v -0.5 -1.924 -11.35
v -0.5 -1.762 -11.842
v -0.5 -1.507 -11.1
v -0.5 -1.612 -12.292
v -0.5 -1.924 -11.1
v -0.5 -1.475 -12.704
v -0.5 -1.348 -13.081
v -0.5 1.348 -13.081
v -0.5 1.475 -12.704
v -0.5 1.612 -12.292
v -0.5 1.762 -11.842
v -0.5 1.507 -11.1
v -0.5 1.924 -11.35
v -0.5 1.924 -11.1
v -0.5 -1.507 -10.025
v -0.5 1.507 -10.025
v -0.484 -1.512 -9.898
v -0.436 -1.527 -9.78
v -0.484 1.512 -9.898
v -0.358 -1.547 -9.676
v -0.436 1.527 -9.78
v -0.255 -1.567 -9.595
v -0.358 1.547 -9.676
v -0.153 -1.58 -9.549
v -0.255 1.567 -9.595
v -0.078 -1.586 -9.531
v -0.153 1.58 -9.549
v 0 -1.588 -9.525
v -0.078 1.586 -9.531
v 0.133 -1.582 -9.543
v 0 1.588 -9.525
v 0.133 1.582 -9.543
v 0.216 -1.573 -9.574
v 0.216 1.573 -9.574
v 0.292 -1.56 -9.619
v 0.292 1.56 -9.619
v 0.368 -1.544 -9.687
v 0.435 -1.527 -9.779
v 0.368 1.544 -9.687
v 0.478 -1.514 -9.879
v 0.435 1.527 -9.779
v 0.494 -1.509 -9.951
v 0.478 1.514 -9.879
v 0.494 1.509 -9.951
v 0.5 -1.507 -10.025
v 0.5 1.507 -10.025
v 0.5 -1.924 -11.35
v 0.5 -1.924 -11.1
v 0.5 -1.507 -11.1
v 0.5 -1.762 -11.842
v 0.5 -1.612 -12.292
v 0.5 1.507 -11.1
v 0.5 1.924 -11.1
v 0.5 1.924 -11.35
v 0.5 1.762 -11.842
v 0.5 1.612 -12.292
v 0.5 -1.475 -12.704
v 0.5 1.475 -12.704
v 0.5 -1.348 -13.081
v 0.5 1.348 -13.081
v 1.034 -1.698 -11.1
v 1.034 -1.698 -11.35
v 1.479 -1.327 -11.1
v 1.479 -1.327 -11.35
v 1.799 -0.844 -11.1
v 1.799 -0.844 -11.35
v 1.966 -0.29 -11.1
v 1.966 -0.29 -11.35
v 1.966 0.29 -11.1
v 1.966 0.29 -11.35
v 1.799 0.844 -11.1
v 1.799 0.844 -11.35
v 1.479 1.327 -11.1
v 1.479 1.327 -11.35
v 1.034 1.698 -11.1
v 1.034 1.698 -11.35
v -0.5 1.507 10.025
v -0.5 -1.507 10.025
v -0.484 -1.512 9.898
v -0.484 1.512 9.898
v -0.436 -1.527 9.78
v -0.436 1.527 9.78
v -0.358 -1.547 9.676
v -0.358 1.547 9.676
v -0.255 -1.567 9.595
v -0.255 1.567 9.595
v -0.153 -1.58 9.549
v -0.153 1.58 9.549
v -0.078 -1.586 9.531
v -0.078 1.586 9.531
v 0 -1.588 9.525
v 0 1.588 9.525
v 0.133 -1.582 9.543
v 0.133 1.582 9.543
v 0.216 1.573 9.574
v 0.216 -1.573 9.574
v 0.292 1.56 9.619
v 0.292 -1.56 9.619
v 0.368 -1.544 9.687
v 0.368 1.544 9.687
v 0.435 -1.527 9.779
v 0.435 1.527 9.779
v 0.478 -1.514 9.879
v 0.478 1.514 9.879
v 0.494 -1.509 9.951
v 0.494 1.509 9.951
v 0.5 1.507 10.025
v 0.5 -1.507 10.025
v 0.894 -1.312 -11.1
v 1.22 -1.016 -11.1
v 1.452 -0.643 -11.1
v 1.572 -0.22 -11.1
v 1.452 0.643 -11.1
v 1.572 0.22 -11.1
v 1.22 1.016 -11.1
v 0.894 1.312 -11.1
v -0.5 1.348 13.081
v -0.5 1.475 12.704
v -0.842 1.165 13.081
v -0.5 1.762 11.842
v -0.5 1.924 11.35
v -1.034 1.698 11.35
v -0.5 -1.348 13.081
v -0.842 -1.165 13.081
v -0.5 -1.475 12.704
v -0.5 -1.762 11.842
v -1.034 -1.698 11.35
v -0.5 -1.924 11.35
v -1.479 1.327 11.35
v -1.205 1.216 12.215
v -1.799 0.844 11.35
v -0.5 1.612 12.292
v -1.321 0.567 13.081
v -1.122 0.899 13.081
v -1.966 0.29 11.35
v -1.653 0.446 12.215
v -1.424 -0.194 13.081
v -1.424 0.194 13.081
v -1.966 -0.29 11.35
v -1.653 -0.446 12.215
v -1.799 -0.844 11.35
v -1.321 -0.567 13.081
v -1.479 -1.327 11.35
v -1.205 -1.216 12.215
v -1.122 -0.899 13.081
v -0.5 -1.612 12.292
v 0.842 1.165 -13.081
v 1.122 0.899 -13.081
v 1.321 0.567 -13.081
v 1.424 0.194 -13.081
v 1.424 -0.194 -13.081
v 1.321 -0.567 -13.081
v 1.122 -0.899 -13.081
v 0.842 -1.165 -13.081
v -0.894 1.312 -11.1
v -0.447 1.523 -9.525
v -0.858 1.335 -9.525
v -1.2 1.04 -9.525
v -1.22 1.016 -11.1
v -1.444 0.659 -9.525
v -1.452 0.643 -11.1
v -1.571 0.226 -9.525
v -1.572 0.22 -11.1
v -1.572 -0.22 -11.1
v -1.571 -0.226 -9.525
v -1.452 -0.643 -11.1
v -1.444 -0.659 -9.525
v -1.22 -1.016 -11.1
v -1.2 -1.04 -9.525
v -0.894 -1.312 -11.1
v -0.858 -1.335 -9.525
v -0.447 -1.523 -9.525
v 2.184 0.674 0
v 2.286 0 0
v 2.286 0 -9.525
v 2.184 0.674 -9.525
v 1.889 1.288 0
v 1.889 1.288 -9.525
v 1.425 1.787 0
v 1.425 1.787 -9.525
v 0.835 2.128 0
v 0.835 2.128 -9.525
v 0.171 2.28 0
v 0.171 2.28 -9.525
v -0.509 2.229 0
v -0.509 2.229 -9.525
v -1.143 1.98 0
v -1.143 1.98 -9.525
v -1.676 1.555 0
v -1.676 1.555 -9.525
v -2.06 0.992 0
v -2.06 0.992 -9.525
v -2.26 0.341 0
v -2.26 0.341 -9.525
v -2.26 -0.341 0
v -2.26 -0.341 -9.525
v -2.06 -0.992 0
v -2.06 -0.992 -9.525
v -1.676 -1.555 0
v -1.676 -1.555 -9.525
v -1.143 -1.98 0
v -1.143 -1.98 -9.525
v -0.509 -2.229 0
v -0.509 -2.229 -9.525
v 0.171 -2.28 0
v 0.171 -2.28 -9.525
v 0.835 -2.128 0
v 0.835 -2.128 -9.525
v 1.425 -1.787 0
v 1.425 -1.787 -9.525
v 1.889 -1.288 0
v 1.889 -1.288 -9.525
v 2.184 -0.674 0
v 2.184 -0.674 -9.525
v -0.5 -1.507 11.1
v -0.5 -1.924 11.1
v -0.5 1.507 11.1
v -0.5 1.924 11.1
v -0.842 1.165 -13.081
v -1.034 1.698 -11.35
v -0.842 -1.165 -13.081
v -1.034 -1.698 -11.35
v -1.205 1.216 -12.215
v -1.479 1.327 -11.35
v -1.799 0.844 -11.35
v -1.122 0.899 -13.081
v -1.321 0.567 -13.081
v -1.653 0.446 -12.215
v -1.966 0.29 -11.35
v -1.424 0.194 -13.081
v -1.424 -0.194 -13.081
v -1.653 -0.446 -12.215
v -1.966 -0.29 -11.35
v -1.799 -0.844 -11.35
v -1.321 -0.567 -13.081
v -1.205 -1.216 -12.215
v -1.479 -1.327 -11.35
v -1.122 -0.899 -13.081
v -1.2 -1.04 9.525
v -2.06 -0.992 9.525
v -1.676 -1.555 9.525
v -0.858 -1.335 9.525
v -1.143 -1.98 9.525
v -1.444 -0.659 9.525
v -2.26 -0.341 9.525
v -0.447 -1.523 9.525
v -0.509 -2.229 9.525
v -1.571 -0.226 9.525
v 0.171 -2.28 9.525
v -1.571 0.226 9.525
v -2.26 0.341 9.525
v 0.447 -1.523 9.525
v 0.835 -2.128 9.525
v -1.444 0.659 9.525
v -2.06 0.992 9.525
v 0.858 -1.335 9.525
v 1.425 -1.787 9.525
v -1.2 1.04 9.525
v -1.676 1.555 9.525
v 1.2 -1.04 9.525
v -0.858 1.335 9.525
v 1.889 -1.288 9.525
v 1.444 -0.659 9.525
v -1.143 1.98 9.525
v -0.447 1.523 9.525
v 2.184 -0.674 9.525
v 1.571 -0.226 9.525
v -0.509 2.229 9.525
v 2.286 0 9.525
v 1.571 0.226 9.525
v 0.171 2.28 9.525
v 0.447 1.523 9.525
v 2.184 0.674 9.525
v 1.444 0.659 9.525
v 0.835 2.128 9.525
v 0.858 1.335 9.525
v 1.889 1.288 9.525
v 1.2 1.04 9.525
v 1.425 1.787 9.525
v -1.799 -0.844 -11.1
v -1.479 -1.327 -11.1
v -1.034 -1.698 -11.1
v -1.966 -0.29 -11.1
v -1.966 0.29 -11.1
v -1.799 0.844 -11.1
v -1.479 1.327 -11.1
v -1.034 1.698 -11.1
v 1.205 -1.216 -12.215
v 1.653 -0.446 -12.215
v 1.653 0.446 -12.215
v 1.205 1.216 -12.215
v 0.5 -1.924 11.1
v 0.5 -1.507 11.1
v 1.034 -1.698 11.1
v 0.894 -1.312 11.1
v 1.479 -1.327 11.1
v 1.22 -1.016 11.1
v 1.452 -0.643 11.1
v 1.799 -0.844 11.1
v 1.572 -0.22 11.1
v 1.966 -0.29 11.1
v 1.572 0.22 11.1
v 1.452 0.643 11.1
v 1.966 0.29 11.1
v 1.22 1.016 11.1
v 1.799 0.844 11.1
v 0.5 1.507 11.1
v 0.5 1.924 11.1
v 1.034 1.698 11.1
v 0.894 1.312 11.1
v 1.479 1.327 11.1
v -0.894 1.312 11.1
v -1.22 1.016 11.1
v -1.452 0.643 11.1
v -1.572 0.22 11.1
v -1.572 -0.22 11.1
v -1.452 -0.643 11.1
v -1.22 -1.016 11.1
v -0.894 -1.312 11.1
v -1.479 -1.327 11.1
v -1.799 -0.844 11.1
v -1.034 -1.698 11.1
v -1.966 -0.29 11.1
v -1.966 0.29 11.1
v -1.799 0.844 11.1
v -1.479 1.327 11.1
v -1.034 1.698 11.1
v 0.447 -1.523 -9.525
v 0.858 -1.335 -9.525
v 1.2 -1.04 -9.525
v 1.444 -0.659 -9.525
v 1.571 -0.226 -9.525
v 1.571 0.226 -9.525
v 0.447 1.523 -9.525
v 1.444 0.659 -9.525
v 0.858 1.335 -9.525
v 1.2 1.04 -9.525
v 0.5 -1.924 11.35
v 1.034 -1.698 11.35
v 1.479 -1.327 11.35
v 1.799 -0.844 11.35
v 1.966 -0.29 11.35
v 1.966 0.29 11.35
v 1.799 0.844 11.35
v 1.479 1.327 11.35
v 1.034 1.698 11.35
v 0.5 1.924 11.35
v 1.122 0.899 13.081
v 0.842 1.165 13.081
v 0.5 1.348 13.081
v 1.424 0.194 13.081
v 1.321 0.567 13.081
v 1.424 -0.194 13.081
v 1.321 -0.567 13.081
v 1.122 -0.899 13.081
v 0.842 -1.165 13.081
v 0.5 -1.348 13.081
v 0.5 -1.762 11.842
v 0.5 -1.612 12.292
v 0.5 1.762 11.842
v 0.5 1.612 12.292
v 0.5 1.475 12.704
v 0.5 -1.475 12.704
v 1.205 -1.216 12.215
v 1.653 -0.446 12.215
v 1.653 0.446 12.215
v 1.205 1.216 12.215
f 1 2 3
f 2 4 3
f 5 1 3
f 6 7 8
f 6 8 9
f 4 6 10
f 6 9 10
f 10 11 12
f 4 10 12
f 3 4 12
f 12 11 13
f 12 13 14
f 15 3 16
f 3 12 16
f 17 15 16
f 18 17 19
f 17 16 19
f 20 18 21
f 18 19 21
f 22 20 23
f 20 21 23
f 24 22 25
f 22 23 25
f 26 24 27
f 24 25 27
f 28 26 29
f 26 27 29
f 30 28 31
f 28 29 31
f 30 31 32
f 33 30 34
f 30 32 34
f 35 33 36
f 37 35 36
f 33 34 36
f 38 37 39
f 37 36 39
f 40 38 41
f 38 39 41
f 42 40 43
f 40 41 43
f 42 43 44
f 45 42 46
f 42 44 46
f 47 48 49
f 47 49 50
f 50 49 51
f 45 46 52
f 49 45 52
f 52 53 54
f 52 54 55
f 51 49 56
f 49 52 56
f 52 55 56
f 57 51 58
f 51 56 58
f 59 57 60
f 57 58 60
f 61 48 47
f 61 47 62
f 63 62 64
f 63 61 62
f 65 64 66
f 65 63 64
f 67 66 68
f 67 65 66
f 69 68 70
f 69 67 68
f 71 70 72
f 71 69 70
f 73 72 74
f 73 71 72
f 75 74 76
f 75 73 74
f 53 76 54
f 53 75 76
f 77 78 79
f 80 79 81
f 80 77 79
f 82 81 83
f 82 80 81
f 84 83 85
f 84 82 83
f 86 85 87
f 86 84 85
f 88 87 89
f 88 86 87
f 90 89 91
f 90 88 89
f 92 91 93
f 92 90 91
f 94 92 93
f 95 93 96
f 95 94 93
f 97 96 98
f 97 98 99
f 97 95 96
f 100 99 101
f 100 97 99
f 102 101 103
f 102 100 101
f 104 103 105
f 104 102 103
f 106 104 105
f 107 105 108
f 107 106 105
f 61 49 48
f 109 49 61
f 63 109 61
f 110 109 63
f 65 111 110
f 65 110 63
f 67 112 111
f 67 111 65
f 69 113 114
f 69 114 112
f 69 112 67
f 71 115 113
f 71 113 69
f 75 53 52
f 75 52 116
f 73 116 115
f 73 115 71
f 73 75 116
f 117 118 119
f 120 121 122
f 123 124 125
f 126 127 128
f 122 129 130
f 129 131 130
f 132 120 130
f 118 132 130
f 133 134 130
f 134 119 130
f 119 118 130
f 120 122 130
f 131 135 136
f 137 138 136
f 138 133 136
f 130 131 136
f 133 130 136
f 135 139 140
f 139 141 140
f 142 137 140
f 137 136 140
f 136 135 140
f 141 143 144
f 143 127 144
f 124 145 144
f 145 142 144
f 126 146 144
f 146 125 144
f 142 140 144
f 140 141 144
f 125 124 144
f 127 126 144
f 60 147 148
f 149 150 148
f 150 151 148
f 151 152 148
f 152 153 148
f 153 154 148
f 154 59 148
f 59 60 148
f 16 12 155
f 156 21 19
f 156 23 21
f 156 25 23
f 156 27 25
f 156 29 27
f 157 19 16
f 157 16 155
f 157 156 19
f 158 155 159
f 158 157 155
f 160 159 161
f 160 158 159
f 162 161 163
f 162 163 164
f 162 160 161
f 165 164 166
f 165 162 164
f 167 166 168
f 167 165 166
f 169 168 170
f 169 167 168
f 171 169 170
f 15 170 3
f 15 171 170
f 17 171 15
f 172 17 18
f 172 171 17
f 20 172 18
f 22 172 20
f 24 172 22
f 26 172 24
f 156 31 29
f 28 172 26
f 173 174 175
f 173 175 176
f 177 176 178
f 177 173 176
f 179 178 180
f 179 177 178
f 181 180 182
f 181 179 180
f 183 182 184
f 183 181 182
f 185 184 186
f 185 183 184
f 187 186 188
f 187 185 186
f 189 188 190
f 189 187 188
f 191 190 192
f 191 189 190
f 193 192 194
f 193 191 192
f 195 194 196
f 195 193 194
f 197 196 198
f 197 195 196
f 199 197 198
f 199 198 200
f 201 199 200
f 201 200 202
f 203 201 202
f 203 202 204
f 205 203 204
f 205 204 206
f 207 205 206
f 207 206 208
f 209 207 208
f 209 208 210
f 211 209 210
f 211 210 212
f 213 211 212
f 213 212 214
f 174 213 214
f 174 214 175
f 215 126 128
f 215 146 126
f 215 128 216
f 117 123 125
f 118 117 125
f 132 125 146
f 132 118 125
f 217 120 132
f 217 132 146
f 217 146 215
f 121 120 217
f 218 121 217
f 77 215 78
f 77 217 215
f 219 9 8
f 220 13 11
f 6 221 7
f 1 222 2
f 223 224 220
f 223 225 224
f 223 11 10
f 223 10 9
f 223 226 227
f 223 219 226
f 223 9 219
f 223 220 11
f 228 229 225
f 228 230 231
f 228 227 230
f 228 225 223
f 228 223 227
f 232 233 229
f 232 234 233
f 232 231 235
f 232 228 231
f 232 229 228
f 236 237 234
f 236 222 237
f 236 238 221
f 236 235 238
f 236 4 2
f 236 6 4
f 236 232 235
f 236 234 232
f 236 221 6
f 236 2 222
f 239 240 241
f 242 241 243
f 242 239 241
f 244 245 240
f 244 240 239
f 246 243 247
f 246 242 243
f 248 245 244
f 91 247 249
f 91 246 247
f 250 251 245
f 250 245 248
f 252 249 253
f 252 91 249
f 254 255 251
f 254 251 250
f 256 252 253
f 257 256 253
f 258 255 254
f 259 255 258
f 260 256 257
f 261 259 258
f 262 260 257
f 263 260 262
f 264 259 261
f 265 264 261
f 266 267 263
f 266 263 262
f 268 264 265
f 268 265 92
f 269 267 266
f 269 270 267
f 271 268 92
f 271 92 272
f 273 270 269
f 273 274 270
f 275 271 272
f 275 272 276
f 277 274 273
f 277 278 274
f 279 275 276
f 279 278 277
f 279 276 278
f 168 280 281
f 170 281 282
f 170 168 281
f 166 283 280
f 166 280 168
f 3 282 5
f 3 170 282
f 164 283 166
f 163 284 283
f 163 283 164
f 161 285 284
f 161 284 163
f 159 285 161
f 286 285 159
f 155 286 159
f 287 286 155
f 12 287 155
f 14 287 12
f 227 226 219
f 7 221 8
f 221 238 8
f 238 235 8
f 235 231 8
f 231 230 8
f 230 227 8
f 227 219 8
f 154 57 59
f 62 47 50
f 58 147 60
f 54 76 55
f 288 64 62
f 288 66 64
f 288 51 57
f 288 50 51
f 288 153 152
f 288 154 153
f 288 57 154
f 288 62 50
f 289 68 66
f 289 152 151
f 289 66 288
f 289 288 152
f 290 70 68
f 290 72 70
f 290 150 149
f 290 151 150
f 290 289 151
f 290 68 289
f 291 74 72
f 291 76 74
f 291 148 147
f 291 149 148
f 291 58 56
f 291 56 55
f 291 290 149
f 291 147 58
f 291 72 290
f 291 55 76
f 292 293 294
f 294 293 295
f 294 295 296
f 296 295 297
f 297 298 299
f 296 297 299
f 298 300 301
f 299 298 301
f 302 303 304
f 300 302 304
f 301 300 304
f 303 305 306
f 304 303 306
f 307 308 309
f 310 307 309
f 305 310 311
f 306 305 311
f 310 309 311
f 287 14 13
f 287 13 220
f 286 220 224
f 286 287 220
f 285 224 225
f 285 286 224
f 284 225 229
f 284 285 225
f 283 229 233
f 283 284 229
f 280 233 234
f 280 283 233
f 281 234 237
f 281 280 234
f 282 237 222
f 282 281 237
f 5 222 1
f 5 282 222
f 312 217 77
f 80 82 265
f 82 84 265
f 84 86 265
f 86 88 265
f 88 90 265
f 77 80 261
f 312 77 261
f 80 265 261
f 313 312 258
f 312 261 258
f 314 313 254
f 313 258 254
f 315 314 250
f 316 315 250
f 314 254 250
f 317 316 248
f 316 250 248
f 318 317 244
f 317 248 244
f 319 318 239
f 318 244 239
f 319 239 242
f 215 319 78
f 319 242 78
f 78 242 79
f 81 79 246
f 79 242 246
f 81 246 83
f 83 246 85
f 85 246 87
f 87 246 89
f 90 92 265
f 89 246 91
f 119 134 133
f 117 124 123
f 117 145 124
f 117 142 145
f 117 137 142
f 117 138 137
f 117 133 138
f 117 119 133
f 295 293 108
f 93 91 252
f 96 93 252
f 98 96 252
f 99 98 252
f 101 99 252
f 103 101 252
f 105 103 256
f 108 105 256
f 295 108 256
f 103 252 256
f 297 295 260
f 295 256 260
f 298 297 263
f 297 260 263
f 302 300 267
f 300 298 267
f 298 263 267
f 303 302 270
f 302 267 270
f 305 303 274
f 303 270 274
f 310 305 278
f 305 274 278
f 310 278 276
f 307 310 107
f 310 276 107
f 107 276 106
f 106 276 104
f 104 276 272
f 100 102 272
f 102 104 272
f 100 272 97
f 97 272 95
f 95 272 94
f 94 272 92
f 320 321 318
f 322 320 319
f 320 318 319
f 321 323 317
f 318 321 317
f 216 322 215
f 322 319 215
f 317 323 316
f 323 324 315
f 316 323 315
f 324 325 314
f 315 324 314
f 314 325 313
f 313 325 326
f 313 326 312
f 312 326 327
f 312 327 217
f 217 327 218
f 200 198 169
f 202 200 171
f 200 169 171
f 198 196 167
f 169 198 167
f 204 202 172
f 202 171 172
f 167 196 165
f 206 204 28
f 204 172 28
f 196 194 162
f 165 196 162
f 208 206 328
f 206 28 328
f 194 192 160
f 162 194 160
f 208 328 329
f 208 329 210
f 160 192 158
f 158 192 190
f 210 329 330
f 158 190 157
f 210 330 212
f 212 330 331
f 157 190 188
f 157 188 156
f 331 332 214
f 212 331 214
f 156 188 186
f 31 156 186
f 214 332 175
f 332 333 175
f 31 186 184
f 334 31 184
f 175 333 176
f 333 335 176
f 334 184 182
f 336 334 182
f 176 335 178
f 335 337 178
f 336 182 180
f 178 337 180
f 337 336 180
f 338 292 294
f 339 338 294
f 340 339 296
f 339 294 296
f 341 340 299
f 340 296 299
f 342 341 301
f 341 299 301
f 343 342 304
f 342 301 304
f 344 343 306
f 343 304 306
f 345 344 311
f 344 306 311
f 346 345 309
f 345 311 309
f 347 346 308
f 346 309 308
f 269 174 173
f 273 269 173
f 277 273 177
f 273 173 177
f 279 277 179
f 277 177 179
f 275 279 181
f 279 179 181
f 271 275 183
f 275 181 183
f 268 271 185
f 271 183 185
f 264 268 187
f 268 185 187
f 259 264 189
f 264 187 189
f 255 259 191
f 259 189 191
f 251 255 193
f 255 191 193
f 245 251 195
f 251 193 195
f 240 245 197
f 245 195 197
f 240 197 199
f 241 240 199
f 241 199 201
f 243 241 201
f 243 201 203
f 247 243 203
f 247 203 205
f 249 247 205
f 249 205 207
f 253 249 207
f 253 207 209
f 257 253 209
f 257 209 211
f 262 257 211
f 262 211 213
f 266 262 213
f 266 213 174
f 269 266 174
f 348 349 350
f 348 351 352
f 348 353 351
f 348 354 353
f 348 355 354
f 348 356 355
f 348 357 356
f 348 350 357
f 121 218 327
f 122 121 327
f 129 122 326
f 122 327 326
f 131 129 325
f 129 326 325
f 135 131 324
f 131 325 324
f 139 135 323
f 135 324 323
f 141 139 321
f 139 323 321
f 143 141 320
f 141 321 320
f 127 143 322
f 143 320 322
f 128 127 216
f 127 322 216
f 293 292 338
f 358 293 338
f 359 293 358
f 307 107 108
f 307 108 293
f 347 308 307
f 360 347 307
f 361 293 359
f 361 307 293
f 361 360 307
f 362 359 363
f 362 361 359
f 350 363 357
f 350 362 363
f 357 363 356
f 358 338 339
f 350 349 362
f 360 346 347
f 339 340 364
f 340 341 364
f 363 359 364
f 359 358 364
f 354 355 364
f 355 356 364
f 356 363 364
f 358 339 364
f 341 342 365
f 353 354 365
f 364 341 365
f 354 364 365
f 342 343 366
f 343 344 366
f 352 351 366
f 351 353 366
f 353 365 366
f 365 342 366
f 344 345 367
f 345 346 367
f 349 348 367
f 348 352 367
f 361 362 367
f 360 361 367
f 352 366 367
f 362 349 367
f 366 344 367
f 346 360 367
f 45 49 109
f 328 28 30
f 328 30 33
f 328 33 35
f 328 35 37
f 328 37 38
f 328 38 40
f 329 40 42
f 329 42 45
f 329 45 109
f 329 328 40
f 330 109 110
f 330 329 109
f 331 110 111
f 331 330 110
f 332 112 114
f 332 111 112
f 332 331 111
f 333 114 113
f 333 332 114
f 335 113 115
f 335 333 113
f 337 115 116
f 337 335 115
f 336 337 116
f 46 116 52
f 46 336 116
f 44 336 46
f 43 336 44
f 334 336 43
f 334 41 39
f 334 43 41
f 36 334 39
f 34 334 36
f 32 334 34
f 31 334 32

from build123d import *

# Parameters (mm, degrees)
F0_R           = 2.286
F1_DEPTH       = 9.525
F3_R           = 1.5875
F4_DEPTH       = 1.5748
F6_R           = 1.9875
F8_DEPTH       = 0.25
F9_R           = 1.4375
F8_FACE_R      = 1.9875
F12_DEPTH      = 2.287
F12_DEPTH_BACK = 2.287


with BuildPart() as f1:
    # F0 (on Top) → F1 (new body)
    with BuildSketch(Plane.XY):
        Circle(F0_R)
    extrude(amount=F1_DEPTH)

    # F3 (on offset) → F4 (join)
    with BuildSketch(Plane.XY.offset(9.525)):
        Circle(F3_R)
    extrude(amount=F4_DEPTH)

    # F6 (on offset) → F8 (join)
    with BuildSketch(Plane.XY.offset(11.0998)):
        Circle(F6_R)
    extrude(amount=F8_DEPTH)

    # F9 (on offset) → F10 section 0
    with BuildSketch(Plane.XY.offset(13.081)):
        Circle(F9_R)
    # F8_face (on face) → F10 section 1
    with BuildSketch(Plane.XY.offset(11.3498)):
        Circle(F8_FACE_R)
    loft()

    # F11 (on Front) → F12 (cut, two sides)
    with BuildSketch(Plane.XZ) as f12_sk:
        with BuildLine():
            Line((0.5, 13.081), (-0.5, 13.081))
            Line((-0.5, 13.081), (-0.5, 10.025))
            ThreePointArc((-0.5, 10.025), (-0.3535533906, 9.6714466094), (0, 9.525))
            ThreePointArc((0, 9.525), (0.3535533906, 9.6714466094), (0.5, 10.025))
            Line((0.5, 10.025), (0.5, 13.081))
        make_face()
    extrude(amount=-F12_DEPTH, mode=Mode.SUBTRACT)
    extrude(f12_sk.sketch, amount=F12_DEPTH_BACK, mode=Mode.SUBTRACT)

    # F13: F1 across plane


with BuildPart() as f1_1:
    add(f1.part)
    add(f1.part.mirror(Plane.XY))


solid = f1_1.part
